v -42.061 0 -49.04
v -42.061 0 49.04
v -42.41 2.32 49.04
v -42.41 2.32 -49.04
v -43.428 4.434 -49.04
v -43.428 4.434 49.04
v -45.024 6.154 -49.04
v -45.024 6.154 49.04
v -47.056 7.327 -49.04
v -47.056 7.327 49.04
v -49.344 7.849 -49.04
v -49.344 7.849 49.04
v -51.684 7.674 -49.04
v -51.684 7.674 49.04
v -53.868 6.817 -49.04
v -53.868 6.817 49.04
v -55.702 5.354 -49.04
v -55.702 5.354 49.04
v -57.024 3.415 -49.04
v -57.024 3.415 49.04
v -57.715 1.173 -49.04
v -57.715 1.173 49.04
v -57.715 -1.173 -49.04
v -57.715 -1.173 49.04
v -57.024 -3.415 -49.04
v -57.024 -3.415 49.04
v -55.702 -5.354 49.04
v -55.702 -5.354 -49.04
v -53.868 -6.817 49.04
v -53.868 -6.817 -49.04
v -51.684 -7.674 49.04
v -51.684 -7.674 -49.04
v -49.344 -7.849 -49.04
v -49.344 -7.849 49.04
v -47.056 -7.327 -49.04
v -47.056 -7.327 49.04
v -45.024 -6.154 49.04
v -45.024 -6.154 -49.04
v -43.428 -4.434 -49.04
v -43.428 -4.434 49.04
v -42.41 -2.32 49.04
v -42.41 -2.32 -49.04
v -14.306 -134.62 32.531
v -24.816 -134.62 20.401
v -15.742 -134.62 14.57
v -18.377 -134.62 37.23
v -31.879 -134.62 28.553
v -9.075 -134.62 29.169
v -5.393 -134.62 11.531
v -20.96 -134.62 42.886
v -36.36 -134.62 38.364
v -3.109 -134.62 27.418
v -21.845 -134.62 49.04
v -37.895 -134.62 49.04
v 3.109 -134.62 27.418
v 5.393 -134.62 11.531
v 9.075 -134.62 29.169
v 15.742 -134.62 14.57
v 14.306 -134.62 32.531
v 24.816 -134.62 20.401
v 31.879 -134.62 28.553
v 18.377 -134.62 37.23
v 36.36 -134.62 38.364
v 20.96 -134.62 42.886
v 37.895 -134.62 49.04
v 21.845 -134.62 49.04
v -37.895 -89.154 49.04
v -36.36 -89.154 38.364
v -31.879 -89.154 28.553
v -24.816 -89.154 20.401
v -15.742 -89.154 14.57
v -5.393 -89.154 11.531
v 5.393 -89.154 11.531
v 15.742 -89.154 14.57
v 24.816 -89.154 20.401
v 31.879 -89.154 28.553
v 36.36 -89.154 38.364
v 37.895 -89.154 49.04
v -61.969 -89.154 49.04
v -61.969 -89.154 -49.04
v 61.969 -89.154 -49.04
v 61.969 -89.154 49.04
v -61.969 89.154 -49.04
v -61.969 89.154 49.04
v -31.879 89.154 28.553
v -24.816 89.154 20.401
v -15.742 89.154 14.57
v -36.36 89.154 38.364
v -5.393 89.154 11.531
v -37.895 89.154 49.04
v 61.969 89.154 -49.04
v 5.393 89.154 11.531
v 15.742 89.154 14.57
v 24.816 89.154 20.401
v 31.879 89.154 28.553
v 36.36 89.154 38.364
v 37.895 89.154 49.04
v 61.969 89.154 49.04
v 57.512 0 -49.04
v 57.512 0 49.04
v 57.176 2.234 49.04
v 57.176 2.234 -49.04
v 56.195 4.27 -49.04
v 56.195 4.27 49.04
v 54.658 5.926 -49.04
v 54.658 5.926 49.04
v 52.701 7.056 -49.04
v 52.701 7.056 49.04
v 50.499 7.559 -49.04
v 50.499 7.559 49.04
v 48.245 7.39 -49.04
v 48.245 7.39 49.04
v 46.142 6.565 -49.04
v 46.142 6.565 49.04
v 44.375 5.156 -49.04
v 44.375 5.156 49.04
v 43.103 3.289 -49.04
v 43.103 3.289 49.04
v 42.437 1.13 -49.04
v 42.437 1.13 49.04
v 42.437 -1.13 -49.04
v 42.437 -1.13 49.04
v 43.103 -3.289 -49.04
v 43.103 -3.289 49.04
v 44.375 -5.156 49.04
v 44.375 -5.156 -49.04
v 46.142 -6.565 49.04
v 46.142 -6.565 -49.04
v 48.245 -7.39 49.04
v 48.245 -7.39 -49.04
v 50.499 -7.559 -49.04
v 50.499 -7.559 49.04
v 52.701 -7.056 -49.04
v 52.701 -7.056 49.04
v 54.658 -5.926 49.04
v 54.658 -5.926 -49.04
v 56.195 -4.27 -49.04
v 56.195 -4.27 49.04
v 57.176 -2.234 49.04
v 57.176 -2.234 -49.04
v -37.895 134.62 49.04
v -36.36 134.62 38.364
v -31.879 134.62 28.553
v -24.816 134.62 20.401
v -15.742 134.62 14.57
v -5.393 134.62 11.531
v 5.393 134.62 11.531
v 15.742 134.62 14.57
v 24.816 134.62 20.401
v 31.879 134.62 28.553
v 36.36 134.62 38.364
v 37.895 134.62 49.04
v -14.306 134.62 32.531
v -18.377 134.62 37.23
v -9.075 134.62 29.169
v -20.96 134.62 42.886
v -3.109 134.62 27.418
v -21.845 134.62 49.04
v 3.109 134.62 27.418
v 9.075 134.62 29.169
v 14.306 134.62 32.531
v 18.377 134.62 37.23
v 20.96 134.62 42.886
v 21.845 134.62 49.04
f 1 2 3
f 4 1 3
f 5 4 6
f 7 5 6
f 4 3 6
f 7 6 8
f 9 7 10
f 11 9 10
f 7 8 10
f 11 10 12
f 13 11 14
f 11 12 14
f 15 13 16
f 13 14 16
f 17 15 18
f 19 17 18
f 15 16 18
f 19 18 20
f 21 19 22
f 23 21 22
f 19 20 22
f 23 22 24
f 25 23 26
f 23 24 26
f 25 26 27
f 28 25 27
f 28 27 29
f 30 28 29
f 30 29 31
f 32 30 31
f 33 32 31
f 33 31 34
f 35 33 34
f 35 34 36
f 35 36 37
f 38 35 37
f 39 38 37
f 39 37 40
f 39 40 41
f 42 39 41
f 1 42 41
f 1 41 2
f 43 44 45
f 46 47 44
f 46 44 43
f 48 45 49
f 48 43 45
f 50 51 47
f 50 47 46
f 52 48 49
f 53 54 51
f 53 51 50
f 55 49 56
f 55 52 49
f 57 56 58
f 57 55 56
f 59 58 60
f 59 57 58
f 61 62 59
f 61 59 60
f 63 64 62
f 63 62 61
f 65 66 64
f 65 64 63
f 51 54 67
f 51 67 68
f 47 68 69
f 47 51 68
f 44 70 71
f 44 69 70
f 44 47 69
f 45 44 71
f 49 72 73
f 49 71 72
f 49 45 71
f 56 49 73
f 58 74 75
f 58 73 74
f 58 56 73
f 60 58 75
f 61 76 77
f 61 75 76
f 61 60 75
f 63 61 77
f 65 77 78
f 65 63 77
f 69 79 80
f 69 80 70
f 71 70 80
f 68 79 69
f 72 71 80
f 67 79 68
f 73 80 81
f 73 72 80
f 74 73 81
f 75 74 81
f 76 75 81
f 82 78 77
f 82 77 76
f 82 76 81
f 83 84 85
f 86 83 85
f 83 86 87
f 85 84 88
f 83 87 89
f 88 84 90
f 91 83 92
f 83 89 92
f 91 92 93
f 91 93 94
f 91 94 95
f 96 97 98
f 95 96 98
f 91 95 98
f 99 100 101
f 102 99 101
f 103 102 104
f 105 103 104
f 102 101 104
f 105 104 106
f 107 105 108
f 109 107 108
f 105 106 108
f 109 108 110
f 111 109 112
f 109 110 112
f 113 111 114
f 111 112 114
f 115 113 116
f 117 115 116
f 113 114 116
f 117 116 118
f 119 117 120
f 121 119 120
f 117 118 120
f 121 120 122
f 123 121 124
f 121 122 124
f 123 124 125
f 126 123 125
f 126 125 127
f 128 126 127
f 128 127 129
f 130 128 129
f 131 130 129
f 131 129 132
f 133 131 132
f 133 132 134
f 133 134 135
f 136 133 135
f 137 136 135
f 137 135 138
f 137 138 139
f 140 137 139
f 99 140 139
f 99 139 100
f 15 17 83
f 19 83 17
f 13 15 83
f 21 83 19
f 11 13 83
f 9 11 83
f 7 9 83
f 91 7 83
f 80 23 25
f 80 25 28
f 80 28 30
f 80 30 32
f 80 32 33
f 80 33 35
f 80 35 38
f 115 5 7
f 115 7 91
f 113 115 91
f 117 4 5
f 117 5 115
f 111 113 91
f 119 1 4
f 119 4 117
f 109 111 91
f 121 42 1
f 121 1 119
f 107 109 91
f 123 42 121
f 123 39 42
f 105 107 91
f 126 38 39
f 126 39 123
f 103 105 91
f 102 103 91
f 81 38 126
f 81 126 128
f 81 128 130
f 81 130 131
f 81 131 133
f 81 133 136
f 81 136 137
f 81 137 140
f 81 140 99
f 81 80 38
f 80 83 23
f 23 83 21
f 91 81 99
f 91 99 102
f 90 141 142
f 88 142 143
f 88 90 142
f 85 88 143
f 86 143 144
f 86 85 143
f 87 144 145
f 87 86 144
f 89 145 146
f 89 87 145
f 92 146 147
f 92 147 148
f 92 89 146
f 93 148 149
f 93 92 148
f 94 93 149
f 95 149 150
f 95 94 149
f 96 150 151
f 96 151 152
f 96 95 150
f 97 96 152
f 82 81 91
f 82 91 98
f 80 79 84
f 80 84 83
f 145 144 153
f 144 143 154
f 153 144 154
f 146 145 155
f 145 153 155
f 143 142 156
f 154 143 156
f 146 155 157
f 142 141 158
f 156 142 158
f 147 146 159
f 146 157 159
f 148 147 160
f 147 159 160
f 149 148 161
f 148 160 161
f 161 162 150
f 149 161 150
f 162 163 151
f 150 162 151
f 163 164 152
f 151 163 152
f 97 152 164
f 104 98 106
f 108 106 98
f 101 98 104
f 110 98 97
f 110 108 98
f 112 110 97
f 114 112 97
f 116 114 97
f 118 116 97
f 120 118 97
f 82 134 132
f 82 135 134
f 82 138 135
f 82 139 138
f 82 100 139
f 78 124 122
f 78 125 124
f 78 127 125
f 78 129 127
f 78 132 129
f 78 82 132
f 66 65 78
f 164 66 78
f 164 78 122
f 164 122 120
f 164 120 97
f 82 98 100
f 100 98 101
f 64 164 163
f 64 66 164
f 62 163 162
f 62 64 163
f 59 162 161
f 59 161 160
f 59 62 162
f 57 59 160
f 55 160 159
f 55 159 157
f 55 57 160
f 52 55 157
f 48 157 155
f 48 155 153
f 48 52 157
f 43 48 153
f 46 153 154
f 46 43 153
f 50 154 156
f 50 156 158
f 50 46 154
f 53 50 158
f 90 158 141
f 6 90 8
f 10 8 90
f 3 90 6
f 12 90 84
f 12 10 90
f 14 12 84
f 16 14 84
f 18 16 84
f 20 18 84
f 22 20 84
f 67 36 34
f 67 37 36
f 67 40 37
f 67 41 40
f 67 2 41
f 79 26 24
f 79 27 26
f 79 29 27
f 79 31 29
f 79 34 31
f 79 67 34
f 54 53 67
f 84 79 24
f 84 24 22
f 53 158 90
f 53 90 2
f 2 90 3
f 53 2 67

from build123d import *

# Parameters (mm, degrees)
F1_DEPTH = 134.62
F2_DEPTH = 89.154
F3_R     = 7.871318
F5_DEPTH = 98.0821
F4_R     = 7.580211
F6_DEPTH = 98.0821


with BuildPart() as f1:
    # F0 (on Front) → F1 (new body, symmetric)
    with BuildSketch(Plane.XZ):
        with BuildLine():
            Line((-21.845277, 49.040429), (-37.894871, 49.040429))
            ThreePointArc((-37.894871, 49.040429), (0, 11.145558), (37.894871, 49.040429))
            Line((37.894871, 49.040429), (21.845277, 49.040429))
            ThreePointArc((21.845277, 49.040429), (0, 27.195152), (-21.845277, 49.040429))
        make_face()
    extrude(amount=F1_DEPTH, both=True)

    # F0 (on Front) → F2 (join, symmetric)
    with BuildSketch(Plane.XZ):
        with BuildLine():
            Line((-37.894871, 49.040429), (-61.969265, 49.040429))
            Line((-61.969265, 49.040429), (-61.969265, -49.040429))
            Line((-61.969265, -49.040429), (61.969265, -49.040429))
            Line((61.969265, -49.040429), (61.969265, 49.040429))
            Line((61.969265, 49.040429), (37.894871, 49.040429))
            ThreePointArc((37.894871, 49.040429), (0, 11.145558), (-37.894871, 49.040429))
        make_face()
    extrude(amount=F2_DEPTH, both=True)

    # F3 (on face) → F5 (cut)
    with BuildSketch(Plane.XY.offset(49.040429)):
        with Locations((-49.932068, 0)):
            Circle(F3_R)
    extrude(amount=-F5_DEPTH, mode=Mode.SUBTRACT)

    # F4 (on face) → F6 (cut)
    with BuildSketch(Plane.XY.offset(49.040429)):
        with Locations((49.932068, 0)):
            Circle(F4_R)
    extrude(amount=-F6_DEPTH, mode=Mode.SUBTRACT)


solid = f1.part
